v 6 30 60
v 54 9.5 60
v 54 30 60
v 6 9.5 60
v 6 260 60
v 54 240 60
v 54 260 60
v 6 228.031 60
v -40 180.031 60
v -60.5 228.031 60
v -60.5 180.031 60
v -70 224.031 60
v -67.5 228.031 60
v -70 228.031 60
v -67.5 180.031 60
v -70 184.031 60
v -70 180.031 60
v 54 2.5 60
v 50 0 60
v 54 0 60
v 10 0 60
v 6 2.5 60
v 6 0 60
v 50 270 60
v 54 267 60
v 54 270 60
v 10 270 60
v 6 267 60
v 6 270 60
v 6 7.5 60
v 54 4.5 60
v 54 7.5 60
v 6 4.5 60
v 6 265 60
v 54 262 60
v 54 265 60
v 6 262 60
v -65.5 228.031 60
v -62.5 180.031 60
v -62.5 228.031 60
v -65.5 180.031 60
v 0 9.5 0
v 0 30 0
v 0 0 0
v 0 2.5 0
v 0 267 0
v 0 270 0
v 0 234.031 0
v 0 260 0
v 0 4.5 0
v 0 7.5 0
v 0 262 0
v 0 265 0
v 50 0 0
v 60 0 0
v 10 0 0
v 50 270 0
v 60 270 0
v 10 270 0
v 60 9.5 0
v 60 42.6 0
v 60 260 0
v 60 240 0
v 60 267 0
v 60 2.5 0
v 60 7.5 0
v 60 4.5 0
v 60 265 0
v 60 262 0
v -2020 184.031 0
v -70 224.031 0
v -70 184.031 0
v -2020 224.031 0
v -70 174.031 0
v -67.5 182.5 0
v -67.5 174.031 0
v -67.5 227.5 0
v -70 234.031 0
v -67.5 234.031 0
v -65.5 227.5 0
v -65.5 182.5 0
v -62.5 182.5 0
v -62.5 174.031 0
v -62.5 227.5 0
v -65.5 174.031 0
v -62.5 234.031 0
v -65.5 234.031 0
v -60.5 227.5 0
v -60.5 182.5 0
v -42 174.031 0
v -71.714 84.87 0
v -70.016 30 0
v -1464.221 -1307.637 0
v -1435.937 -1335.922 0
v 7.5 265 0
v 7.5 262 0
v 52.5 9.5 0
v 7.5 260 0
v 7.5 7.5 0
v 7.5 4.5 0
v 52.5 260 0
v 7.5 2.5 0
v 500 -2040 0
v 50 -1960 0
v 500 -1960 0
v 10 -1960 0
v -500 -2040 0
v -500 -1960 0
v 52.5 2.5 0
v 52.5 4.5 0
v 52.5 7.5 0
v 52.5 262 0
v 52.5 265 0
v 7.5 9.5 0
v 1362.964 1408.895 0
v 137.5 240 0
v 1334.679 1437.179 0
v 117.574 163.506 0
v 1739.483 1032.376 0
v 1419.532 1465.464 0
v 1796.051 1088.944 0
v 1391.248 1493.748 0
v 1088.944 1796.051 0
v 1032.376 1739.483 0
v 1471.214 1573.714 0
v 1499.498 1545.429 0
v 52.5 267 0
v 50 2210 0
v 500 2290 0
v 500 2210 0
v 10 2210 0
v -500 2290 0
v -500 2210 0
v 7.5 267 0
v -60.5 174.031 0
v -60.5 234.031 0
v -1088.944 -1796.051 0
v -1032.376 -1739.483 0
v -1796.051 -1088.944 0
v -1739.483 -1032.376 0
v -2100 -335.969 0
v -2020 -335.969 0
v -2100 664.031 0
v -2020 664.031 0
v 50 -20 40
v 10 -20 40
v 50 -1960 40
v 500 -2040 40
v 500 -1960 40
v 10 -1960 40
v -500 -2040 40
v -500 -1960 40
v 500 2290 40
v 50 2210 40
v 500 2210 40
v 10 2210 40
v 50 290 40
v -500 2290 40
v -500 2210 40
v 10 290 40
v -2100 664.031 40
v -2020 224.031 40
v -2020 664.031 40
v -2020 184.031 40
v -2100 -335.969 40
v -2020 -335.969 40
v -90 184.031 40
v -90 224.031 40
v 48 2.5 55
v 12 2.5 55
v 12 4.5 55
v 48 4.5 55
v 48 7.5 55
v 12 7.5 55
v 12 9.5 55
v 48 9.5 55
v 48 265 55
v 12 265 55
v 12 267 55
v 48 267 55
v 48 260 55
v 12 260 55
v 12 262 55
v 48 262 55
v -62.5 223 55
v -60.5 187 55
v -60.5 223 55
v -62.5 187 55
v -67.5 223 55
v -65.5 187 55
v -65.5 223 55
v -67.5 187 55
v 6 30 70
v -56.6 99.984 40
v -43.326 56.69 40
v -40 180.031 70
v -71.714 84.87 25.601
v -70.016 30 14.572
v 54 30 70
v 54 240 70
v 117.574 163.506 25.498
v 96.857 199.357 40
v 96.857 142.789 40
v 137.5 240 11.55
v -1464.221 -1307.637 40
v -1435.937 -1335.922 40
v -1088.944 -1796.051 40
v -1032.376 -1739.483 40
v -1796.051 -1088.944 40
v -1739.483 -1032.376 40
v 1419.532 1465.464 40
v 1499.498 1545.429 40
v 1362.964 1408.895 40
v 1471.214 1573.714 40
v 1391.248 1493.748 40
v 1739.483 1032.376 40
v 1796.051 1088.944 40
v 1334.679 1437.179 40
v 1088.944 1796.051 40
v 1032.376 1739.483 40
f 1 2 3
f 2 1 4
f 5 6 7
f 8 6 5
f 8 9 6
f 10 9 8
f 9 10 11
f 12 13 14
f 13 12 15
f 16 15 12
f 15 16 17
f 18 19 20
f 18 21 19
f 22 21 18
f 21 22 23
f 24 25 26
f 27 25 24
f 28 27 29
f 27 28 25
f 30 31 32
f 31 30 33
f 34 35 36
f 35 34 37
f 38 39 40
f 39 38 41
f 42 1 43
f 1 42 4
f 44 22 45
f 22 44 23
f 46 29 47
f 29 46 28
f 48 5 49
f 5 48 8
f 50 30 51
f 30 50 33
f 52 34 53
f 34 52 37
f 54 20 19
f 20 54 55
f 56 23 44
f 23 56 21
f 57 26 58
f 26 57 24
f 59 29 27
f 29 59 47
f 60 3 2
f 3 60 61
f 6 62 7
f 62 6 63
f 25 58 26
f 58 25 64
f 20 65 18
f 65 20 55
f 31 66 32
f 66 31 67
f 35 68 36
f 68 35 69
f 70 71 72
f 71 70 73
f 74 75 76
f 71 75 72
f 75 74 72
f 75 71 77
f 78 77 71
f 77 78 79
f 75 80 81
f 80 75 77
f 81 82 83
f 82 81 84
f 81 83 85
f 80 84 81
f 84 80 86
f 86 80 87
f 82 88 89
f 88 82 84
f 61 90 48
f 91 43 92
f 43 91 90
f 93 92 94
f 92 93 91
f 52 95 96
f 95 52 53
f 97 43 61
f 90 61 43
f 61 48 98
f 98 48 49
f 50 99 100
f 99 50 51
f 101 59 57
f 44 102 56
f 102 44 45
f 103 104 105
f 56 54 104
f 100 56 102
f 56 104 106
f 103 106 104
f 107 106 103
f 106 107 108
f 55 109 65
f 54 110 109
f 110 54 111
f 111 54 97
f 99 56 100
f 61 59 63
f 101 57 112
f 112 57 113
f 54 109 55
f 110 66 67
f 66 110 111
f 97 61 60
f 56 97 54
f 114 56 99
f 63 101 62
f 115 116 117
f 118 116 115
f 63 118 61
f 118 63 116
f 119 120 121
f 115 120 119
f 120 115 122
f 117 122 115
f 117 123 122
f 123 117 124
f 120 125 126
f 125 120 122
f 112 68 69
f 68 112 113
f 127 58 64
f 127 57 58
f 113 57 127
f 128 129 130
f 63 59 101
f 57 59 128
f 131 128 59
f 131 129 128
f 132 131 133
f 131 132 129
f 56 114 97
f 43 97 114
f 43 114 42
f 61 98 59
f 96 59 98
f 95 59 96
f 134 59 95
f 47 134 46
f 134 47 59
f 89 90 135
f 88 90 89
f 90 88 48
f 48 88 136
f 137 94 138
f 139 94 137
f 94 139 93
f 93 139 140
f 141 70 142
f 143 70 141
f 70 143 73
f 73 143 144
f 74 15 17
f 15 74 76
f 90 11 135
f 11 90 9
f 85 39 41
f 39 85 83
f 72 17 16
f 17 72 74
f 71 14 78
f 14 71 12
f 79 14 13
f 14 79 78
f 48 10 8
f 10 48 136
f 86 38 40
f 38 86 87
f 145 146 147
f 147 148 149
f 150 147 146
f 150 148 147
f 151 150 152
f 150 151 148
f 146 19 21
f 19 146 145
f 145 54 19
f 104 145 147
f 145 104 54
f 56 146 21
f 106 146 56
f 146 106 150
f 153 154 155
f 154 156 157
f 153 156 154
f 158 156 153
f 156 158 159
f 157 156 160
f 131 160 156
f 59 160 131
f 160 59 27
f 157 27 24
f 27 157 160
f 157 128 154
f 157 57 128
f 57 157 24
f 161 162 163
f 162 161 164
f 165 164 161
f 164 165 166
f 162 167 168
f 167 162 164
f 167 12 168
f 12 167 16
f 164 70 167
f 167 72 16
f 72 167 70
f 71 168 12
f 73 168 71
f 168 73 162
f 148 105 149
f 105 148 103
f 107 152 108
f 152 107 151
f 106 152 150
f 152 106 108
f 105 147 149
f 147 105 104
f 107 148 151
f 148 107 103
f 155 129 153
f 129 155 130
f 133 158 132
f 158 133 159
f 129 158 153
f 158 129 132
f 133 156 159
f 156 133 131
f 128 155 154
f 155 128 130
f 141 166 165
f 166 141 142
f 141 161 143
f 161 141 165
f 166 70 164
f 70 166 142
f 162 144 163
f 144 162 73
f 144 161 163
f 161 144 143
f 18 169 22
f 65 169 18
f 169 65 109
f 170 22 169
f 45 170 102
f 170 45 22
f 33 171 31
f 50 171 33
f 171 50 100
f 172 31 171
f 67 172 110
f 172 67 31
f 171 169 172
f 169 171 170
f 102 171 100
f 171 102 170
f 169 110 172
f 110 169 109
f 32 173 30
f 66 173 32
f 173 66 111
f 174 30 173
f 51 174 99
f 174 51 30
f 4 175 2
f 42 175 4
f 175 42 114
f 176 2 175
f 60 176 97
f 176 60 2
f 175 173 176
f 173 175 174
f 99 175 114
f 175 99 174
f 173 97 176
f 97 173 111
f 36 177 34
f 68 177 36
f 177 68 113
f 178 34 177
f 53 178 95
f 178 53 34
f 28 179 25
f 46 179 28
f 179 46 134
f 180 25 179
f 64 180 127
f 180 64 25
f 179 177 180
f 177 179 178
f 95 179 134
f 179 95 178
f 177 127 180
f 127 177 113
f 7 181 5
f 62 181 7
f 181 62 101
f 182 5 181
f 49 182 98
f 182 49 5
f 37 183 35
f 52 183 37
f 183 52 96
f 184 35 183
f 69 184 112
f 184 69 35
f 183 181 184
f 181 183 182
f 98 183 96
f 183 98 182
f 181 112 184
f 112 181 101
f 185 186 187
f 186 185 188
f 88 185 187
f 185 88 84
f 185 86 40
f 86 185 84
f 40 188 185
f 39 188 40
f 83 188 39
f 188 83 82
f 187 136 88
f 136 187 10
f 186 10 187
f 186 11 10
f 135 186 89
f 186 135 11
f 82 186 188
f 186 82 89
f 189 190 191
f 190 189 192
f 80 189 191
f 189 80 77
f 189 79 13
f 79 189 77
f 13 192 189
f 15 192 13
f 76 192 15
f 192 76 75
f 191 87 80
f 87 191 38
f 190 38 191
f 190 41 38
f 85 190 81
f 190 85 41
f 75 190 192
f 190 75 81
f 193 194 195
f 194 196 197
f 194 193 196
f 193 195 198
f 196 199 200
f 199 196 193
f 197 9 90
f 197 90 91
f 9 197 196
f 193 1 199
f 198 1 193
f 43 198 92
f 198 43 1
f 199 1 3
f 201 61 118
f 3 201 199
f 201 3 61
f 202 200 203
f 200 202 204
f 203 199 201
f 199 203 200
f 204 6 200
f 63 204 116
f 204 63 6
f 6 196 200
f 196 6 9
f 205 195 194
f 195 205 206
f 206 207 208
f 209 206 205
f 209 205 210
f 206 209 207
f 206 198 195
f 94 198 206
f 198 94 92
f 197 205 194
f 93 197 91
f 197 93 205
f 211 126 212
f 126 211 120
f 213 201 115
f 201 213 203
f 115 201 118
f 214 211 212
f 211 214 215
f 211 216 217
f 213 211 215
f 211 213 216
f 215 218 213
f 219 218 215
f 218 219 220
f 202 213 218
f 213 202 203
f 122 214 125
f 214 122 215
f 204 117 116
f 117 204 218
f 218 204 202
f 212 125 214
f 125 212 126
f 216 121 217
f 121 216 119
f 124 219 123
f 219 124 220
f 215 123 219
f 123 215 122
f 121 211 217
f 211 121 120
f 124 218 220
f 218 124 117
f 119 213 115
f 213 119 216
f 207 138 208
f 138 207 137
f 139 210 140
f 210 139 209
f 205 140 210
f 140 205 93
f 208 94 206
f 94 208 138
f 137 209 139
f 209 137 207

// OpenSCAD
//Define design parameters
//Du=2; //asked not to use Du as basis, HC design itself is already changed from this scaling
//I=80;
//width_x = 20*Du;
//length_y = 48.6*Du+I;
//height_z= 40.5*Du;
//channel_length=3000;
//w=0.05*channel_length; // length of narrowing piece in y direction
//s_channel=20;// thickness of channel in x direction
//l=s_channel;
//h=height_z;
//channel_height=10;
//height_spacing=10;// distance between top of holder and top of narrowing section
//r1=80;
//h_dot= channel_height;

//*****edit based on David's code*****
//hydrocyclone holder dimensions
width_x = 60;
length_y = 250;
height_z = 60;

//hydrocyclone parameters
n=36;
DU=4;
DO=4;
DC=5*DU;
theta=9;
cyc_h=0.75*DC;
l=(DC/2)/tan(theta/2);
vortex_h=1.25*DC;
exit_l=(length_y-(l+cyc_h))/2;

//trapezoidal deformation
wdiff = 20; //percent, width difference
//inlet branch dimensions
width_in = 60;
length_in = 60;
ypos_in = exit_l+l+cyc_h-DU/2-0.5*width_in; 
//ypos_in = -25+length_y-0.5*width_in;
//narrow (transition from holder to channel) and channel parameters
width_chan = 40;
height_chan = 40;
length_chan = 2000;
offset1 = 0; //height gap from top of the holder to the top of the narrow, for overflow and underflow outlets
offset2 = 0; //height gap, for inlet part
height_nar1 = (height_z - height_chan - offset1);
length_nar1 = (height_z - height_chan - offset1); //45 deg slope
height_nar2 = (height_z - height_chan - offset2);
length_nar2 = (height_z - height_chan - offset2); 
//adhesive channel variables
offset3 = 20; //safe distance from the boundary of holder to prevent adhesive leaking
h_gap = 10; //additional height to allow adhesive flow thru over and under the holder
//adhesive channel - polyhedron coordinate 
xpos1 = -(length_in-offset3);
xpos2 = width_x*wdiff/200; //to weld on the top of trapezoid
xpos3 = xpos1 - 50;
ypos1 = offset3;
ypos2 = ypos_in+width_in*wdiff/200;
zpos1 = height_z + h_gap;

xpos4 = width_x*(1-wdiff/200);
xpos5 = xpos4 + 100;
ypos3 = length_y - offset3;
l_grooved=length_y/25;

length_groove = 2;


t_groove= 5;

height_groove=height_z-t_groove;
width_x_groove=0.75*width_x;

module channel_mold(){
    module prism(x,y,z){
        polyhedron(
            points=[[0,0,z],[x,0,z], [x,y,z], [0,y,z], [0,y,0], [x,y,0]],
            faces = [
                [0,1,2,3], //top
                [5,4,3,2], // back
                [0,4,5,1], //diagonal plane
                [0,3,4],[5,2,1] // sidewalls
            ]
        );
    }
    
    module cornercut(w,l,h){
        rotate([0,0,90])
        translate([0,-w*wdiff/200,0])
        prism(l,w*wdiff/200,h);
        
        rotate([0,0,90])
        translate([l,-w*(1-wdiff/200),0])
        prism(-l,-w*wdiff/200,h);
    }
    
    module trapezoid(w,l,h){
        difference(){
            cube(size=[w,l,h]);
            cornercut(w,l,h);
        }
    }
    
    //hydrocyclone holder, overflow-to-underflow part
    trapezoid(width_x,length_y+2*l_grooved,height_z);
    //hydrocyclone holder, inlet branch part 
    rotate([0,0,90])
    translate([ypos_in+l_grooved,-width_x*wdiff/200,0])
    trapezoid(width_in,l_grooved+length_in+width_x*wdiff/200,height_z);//w*wdiff/200 is offset to union inlet part to the rest of holder without leaving any gap caused by corner cut          

    //long channels for fluidic interfacing
    module narrow(x,y,z){
        polyhedron(
            points=[[0,0,0],[x,0,0],[x,y,0],[0,y,0],[0,y,z],[x,y,z]],
            faces=[
                [0,1,2,3], //bottom
                [5,4,3,2], //back
                [0,4,5,1], //slide
                [0,3,4],[5,2,1] //side walls
            ]
        );
    }
    //narrow: transition part from holder to long channel
    //narrow for underflow outlet
    translate([0.5*(width_x-width_chan),-length_nar1,height_chan])
    narrow(width_chan,length_nar1,height_nar1);
    //narrow for overflow outlet
    rotate([0,0,180])
    translate([-0.5*(width_chan+width_x),-(length_y+length_nar1+2*l_grooved),height_chan])
    narrow(width_chan,length_nar1,height_nar1);
    //narrow for inlet
    rotate([0,0,-90])
    translate([-(ypos_in+0.5*(width_in+width_chan)+l_grooved),-(length_nar2+length_in)-l_grooved,height_chan])
    narrow(width_chan,length_nar2,height_nar2);
    
    //long channel - underflow
    translate([0.5*(width_x-width_chan),-length_chan,0])
    cube(size=[width_chan,length_chan,height_chan]);
    //long channel - overflow
    translate([0.5*(width_x-width_chan),length_y,0])
    cube(size=[width_chan,length_chan,height_chan]);
    //long channel - inlet
    rotate([0,0,90])
    translate([(ypos_in-0.5*(width_chan-width_in)+l_grooved),length_in,0])
    cube(size=[width_chan,length_chan,height_chan]);

    //marks at the end of each channels
    translate([0,-length_chan,0.5*height_chan])
    cube(size=[0.5*length_chan,2*width_chan,height_chan], center=true);
    translate([0,length_chan+length_y,0.5*height_chan])
    cube(size=[0.5*length_chan,2*width_chan,height_chan], center=true);
    rotate([0,0,90])
    translate([ypos_in,length_chan+length_in,0.5*height_chan])
    cube(size=[0.5*length_chan,2*width_chan,height_chan], center=true);
    

  
}






//channel_mold();

module prism(x,y,z){
        polyhedron(
            points=[[0,0,z],[x,0,z], [x,y,z], [0,y,z], [0,y,0], [x,y,0]],
            faces = [
                [0,1,2,3], //top
                [5,4,3,2], // back
                [0,4,5,1], //diagonal plane
                [0,3,4],[5,2,1] // sidewalls
            ]
        );
    }
    
    module cornercut(w,l,h){
        rotate([0,0,90])
        translate([0,-w*wdiff/200,0])
        prism(l,w*wdiff/200,h);
        
        rotate([0,0,90])
        translate([l,-w*(1-wdiff/200),0])
        prism(-l,-w*wdiff/200,h);
    }
    
    module trapezoid(w,l,h){
        difference(){
            cube(size=[w,l,h]);
            cornercut(w,l,h);
        }
    }
module grooves() { 
 
    module single_groove(){
        
        difference(){
     trapezoid(width_x,length_groove,height_z);
    
    translate([0.5*(width_x-width_x_groove), 0,0])
    trapezoid(width_x_groove,length_groove,height_groove);
        }
    }
    
   module single_groove_in(){
     difference(){
     trapezoid(1.05*width_in,length_groove,height_z);
    
    translate([0.5*(width_in-width_x_groove), 0,0])
    trapezoid((width_in/width_x)*width_x_groove,length_groove,height_groove);
       
     }
 }
 
translate([0,0.25*l_grooved,0]) 
  single_groove();
    

translate([0,0.75*l_grooved,0])    
single_groove();


translate([0,length_y+1.5*l_grooved,0])
single_groove();

translate([0,length_y+l_grooved,0])
single_groove();
  
translate([-length_in-0.25*l_grooved,length_y-(width_in-width_x_groove),0])  

//translate([-length_in-0.25*l_grooved,length_y+0.5*(width_in-width_x_groove),0]) try with length_y=200   
rotate([0,0,270]) 
single_groove_in();    

translate([-length_in-0.75*l_grooved,length_y-(width_in-width_x_groove),0])   
rotate([0,0,270]) 
single_groove_in(); 



}



difference(){
channel_mold();
    
grooves();
}




//Adhesive path - holder part
module adhesive_mold(){    
    module adbox1(){
        polyhedron(
            points=[
                [xpos3,ypos1,0],[xpos2,ypos1,0],[xpos2,ypos2,0],[xpos1,ypos2,0], //4 bottom face points
                [xpos1,ypos2,zpos1],[xpos2,ypos2,zpos1],[xpos2,ypos1,zpos1]], //3 points at holder top
            faces=[
                [0,1,2,3], [5,4,3,2],[6,5,2,1],[5,6,4],[4,6,0],[0,3,4],[0,6,1]]
            );
    }
    module adbox2(){
        polyhedron(
            points=[
                [xpos4,ypos1,0],[xpos5,ypos3,0],[xpos4,ypos3,0], //3 bottom face points
                [xpos4,ypos3,zpos1],[xpos4,ypos1,zpos1]],
            faces=[
                [0,1,2],[2,3,4,0],[0,4,1],[3,2,1],[1,4,3]]
            );
    }
    module adbox3(){
        polyhedron(
            points=[
                [xpos2, ypos1, height_z],[xpos4,ypos1,height_z],[xpos4,ypos3,height_z],[xpos1,ypos2,height_z], //4 bottom poinst @ holder top
                [xpos1, ypos2, zpos1],[xpos2,ypos1,zpos1],[xpos4,ypos1,zpos1],[xpos4,ypos3,zpos1]],
            faces=[
                [0,1,2,3],[4,3,2,7],[0,3,4,5],[2,1,6,7],[1,0,5,6],[7,6,5,4]]
            );
    }
    
    translate([0,l_grooved,0])
    adbox1();
    translate([0,l_grooved,0])
    adbox2();
    translate([0,l_grooved,0])
    adbox3();

    //Adhesive path - channel
    //rough positioning to submerge channel into adbox
    translate([0.5*(xpos3+width_chan),0.5*(ypos2-width_chan+2*l_grooved),0])
    rotate([0,0,135])
    cube(size=[width_chan,length_chan,height_chan]);
    translate([0.5*(xpos5-width_chan),0.55*(ypos3+width_chan+2*l_grooved),0])
    rotate([0,0,-45])
    cube(size=[width_chan,length_chan,height_chan]);
    //marks at the end of each channels
    translate([length_chan/sqrt(2),length_chan/sqrt(2),0.5*height_chan])
    rotate([0,0,-45])
    cube(size=[0.5*length_chan,2*width_chan,height_chan], center=true);
    translate([-length_chan/sqrt(2),-length_chan/sqrt(2),0.5*height_chan])
    rotate([0,0,-45])
    cube(size=[0.5*length_chan,2*width_chan,height_chan], center=true);
    
}
color("blue",0.75)
adhesive_mold();
